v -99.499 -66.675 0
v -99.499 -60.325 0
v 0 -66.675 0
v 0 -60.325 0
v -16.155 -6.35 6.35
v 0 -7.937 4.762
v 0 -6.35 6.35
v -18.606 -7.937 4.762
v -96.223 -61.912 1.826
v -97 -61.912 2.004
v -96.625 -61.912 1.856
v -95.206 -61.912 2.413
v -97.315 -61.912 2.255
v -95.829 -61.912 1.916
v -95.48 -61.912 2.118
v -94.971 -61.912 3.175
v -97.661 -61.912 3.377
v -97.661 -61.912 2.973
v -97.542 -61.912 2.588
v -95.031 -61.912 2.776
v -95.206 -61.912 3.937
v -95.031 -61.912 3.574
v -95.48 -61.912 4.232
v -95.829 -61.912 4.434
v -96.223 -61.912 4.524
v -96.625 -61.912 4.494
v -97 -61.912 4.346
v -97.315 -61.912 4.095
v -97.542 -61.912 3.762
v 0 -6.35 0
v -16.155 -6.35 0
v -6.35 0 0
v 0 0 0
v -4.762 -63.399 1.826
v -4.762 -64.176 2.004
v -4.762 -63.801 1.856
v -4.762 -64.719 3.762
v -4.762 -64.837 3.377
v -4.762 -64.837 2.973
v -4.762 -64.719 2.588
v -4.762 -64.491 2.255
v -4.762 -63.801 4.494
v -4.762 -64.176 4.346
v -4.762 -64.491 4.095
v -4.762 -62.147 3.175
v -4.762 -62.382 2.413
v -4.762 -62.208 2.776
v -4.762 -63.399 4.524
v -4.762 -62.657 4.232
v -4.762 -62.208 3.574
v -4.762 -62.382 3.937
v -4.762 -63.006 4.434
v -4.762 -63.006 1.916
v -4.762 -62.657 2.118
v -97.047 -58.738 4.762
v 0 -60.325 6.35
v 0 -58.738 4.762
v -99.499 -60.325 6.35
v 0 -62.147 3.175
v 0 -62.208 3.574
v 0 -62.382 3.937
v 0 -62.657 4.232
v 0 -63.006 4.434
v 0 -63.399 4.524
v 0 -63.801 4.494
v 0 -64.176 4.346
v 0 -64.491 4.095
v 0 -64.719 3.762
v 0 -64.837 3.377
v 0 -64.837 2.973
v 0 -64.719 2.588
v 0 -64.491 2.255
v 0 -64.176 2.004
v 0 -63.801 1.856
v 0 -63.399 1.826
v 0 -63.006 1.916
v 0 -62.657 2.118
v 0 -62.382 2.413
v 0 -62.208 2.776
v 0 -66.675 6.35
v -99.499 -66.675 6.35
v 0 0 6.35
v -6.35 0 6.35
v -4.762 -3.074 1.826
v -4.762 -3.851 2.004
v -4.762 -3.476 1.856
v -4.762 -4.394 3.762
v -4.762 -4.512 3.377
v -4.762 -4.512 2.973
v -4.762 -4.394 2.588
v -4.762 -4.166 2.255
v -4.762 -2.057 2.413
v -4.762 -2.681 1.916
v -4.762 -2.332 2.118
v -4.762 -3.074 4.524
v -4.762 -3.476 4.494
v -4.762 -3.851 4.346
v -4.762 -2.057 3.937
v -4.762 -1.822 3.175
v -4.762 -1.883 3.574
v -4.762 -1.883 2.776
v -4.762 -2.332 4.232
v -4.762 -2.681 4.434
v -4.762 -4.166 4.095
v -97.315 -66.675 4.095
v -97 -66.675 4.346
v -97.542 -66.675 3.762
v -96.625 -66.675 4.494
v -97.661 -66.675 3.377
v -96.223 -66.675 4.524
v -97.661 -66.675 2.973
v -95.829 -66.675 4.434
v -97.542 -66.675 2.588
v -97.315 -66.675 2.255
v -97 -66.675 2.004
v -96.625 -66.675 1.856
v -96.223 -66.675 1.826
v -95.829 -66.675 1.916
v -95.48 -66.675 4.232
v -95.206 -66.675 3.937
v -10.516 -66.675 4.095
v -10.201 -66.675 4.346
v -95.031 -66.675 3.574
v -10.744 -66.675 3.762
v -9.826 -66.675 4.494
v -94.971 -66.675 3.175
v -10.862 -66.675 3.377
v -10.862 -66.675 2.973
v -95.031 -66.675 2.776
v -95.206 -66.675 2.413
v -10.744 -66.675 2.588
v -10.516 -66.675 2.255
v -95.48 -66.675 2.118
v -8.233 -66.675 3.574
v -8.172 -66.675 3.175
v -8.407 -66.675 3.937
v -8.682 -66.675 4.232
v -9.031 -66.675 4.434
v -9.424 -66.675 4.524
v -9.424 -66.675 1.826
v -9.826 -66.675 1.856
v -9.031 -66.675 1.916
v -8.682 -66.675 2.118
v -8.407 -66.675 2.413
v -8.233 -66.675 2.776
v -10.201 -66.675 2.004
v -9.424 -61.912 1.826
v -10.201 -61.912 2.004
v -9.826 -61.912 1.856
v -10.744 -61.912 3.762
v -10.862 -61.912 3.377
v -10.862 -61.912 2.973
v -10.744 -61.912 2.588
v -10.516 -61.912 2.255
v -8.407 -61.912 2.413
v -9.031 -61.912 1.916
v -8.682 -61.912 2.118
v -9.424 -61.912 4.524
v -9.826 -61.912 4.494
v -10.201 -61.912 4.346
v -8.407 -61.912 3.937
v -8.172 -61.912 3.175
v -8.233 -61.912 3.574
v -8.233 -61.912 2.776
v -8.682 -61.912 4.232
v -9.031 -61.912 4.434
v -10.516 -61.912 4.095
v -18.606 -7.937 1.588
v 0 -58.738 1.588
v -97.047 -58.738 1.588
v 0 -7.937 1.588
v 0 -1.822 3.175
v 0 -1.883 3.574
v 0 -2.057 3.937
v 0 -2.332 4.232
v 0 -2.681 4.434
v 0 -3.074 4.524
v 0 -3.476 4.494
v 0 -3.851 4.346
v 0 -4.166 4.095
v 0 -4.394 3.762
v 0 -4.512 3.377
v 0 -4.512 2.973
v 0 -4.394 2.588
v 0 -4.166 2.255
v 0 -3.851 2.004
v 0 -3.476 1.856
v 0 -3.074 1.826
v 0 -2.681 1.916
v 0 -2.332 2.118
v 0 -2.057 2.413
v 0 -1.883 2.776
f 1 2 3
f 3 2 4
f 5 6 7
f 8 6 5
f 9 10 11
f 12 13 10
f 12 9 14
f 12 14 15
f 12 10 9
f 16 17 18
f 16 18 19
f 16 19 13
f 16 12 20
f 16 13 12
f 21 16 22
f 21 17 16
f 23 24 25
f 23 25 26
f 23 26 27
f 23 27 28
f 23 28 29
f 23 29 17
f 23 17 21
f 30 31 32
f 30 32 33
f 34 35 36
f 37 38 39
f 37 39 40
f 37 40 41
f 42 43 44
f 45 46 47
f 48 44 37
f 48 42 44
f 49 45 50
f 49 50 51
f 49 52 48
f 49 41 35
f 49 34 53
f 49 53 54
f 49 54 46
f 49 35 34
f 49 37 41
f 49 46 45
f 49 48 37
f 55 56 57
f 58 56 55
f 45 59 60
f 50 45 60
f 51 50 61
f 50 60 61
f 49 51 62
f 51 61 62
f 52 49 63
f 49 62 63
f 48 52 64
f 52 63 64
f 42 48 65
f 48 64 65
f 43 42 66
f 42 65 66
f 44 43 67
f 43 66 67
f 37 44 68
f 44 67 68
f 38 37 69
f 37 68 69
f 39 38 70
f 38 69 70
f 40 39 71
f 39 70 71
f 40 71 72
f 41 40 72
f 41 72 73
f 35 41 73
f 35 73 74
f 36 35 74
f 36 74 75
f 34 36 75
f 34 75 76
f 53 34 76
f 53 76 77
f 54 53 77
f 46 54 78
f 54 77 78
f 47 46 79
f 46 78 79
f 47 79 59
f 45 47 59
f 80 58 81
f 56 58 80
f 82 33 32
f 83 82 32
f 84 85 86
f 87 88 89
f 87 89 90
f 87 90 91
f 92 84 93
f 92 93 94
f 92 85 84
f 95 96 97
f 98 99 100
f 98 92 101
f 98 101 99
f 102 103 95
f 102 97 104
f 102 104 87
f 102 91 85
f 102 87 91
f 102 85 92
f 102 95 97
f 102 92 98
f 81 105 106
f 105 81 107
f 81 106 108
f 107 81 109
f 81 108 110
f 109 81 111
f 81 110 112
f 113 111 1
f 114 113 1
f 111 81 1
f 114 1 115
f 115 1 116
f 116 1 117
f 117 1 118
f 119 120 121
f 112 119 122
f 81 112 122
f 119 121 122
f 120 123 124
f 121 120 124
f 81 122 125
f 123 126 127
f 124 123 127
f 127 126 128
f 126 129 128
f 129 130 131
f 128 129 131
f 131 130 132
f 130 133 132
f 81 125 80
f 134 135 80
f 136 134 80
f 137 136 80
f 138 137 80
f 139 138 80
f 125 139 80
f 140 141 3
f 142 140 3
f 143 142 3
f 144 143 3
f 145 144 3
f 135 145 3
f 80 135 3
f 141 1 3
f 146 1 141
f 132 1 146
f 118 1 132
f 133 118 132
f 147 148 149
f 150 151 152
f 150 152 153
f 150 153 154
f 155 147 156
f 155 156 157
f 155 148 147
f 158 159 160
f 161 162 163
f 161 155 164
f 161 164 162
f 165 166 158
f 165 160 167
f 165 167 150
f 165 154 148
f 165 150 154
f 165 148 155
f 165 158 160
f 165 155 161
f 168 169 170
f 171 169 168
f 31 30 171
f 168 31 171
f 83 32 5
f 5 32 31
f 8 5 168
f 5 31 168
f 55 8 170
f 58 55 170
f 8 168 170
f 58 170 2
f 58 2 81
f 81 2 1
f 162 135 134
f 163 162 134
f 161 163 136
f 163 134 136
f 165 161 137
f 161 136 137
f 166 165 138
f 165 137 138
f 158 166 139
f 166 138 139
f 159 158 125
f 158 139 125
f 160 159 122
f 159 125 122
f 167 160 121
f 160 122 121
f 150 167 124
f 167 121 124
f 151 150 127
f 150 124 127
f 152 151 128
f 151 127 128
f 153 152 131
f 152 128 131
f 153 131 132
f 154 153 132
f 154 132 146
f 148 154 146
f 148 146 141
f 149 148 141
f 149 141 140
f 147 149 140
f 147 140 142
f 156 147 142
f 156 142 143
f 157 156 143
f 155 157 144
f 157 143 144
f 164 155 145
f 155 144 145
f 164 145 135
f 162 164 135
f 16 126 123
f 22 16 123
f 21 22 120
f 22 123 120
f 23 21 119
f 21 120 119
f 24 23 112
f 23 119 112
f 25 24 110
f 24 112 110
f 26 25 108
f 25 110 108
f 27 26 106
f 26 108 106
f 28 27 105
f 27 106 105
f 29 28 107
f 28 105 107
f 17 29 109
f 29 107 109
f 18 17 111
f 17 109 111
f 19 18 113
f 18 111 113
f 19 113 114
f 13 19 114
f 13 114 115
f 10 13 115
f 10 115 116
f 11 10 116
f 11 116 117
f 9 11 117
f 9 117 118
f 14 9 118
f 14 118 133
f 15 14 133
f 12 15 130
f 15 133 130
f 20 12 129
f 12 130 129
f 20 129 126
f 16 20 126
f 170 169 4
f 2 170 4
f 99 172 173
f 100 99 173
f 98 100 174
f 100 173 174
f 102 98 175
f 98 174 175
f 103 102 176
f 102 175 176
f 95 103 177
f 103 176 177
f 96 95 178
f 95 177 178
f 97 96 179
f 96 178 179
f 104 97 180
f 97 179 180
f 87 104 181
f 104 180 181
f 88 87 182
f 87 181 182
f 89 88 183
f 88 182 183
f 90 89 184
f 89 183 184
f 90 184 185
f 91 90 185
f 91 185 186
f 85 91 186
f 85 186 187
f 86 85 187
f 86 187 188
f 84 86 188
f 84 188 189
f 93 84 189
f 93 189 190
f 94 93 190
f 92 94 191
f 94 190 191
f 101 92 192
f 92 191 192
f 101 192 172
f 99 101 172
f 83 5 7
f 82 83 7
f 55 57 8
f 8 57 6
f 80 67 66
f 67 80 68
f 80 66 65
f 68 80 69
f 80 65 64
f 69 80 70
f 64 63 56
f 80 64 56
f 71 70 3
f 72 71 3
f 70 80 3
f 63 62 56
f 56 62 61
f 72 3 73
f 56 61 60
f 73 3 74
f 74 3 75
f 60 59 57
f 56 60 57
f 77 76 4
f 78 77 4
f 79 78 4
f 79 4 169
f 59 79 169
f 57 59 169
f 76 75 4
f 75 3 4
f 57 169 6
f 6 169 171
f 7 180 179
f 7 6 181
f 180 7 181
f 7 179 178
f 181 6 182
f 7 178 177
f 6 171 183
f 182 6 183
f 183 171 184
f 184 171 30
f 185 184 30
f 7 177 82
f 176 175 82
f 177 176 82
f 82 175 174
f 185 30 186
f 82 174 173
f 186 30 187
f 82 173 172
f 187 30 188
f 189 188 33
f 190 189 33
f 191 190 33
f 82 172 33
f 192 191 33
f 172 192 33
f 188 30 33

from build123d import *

# Parameters (mm, degrees)
F1_DEPTH = 6.35
F2_R     = 1.35255
F3_DEPTH = 4.7625
F4_R     = 1.35255
F5_DEPTH = 4.7625
F6_W     = 53.975
F6_H     = 1.5875
F7_DEPTH = 99.4996370206
F8_SIZE  = 1.58749


# Not quite as in the source:
# - a fillet or chamfer is up to 0.001 mm smaller than in the source, because OpenCascade refuses the exact size


with BuildPart() as f1:
    # F0 (on Top) → F1 (new body)
    with BuildSketch(Plane.XY):
        Polygon((0, -66.675), (0, 0), (-6.35, 0), (-99.4986370206, -60.325), (-99.4986370206, -66.675), align=None)
    extrude(amount=F1_DEPTH)

    # F2 (on face) → F3 (cut)
    with BuildSketch(Plane.YZ):
        with Locations((-63.5, 3.175)):
            Circle(F2_R)
        with Locations((-3.175, 3.175)):
            Circle(F2_R)
    extrude(amount=-F3_DEPTH, mode=Mode.SUBTRACT)

    # F4 (on face) → F5 (cut)
    with BuildSketch(Plane.XZ.offset(66.675)):
        with Locations((-96.3236370206, 3.175)):
            Circle(F4_R)
        with Locations((-9.525, 3.175)):
            Circle(F4_R)
    extrude(amount=-F5_DEPTH, mode=Mode.SUBTRACT)

    # F6 (on face) → F7 (cut, through all)
    with BuildSketch(Plane.YZ):
        with Locations((-33.3375, 5.55625)):
            Rectangle(F6_W, F6_H)
        with Locations((-33.3375, 0.79375)):
            Rectangle(F6_W, F6_H)
    extrude(amount=-F7_DEPTH, mode=Mode.SUBTRACT)

    # F8 (size 1.5875 in the source; OpenCascade refuses exactly that, so slightly less here)
    f8_edges = [f1.edges().sort_by_distance(p)[0] for p in [
        (-49.749319, -60.325, 4.7625),
        (-49.749319, -60.325, 1.5875),
        (-8.07756, -6.35, 4.7625),
        (-8.07756, -6.35, 1.5875),
    ]]
    chamfer(f8_edges, length=F8_SIZE)


solid = f1.part
